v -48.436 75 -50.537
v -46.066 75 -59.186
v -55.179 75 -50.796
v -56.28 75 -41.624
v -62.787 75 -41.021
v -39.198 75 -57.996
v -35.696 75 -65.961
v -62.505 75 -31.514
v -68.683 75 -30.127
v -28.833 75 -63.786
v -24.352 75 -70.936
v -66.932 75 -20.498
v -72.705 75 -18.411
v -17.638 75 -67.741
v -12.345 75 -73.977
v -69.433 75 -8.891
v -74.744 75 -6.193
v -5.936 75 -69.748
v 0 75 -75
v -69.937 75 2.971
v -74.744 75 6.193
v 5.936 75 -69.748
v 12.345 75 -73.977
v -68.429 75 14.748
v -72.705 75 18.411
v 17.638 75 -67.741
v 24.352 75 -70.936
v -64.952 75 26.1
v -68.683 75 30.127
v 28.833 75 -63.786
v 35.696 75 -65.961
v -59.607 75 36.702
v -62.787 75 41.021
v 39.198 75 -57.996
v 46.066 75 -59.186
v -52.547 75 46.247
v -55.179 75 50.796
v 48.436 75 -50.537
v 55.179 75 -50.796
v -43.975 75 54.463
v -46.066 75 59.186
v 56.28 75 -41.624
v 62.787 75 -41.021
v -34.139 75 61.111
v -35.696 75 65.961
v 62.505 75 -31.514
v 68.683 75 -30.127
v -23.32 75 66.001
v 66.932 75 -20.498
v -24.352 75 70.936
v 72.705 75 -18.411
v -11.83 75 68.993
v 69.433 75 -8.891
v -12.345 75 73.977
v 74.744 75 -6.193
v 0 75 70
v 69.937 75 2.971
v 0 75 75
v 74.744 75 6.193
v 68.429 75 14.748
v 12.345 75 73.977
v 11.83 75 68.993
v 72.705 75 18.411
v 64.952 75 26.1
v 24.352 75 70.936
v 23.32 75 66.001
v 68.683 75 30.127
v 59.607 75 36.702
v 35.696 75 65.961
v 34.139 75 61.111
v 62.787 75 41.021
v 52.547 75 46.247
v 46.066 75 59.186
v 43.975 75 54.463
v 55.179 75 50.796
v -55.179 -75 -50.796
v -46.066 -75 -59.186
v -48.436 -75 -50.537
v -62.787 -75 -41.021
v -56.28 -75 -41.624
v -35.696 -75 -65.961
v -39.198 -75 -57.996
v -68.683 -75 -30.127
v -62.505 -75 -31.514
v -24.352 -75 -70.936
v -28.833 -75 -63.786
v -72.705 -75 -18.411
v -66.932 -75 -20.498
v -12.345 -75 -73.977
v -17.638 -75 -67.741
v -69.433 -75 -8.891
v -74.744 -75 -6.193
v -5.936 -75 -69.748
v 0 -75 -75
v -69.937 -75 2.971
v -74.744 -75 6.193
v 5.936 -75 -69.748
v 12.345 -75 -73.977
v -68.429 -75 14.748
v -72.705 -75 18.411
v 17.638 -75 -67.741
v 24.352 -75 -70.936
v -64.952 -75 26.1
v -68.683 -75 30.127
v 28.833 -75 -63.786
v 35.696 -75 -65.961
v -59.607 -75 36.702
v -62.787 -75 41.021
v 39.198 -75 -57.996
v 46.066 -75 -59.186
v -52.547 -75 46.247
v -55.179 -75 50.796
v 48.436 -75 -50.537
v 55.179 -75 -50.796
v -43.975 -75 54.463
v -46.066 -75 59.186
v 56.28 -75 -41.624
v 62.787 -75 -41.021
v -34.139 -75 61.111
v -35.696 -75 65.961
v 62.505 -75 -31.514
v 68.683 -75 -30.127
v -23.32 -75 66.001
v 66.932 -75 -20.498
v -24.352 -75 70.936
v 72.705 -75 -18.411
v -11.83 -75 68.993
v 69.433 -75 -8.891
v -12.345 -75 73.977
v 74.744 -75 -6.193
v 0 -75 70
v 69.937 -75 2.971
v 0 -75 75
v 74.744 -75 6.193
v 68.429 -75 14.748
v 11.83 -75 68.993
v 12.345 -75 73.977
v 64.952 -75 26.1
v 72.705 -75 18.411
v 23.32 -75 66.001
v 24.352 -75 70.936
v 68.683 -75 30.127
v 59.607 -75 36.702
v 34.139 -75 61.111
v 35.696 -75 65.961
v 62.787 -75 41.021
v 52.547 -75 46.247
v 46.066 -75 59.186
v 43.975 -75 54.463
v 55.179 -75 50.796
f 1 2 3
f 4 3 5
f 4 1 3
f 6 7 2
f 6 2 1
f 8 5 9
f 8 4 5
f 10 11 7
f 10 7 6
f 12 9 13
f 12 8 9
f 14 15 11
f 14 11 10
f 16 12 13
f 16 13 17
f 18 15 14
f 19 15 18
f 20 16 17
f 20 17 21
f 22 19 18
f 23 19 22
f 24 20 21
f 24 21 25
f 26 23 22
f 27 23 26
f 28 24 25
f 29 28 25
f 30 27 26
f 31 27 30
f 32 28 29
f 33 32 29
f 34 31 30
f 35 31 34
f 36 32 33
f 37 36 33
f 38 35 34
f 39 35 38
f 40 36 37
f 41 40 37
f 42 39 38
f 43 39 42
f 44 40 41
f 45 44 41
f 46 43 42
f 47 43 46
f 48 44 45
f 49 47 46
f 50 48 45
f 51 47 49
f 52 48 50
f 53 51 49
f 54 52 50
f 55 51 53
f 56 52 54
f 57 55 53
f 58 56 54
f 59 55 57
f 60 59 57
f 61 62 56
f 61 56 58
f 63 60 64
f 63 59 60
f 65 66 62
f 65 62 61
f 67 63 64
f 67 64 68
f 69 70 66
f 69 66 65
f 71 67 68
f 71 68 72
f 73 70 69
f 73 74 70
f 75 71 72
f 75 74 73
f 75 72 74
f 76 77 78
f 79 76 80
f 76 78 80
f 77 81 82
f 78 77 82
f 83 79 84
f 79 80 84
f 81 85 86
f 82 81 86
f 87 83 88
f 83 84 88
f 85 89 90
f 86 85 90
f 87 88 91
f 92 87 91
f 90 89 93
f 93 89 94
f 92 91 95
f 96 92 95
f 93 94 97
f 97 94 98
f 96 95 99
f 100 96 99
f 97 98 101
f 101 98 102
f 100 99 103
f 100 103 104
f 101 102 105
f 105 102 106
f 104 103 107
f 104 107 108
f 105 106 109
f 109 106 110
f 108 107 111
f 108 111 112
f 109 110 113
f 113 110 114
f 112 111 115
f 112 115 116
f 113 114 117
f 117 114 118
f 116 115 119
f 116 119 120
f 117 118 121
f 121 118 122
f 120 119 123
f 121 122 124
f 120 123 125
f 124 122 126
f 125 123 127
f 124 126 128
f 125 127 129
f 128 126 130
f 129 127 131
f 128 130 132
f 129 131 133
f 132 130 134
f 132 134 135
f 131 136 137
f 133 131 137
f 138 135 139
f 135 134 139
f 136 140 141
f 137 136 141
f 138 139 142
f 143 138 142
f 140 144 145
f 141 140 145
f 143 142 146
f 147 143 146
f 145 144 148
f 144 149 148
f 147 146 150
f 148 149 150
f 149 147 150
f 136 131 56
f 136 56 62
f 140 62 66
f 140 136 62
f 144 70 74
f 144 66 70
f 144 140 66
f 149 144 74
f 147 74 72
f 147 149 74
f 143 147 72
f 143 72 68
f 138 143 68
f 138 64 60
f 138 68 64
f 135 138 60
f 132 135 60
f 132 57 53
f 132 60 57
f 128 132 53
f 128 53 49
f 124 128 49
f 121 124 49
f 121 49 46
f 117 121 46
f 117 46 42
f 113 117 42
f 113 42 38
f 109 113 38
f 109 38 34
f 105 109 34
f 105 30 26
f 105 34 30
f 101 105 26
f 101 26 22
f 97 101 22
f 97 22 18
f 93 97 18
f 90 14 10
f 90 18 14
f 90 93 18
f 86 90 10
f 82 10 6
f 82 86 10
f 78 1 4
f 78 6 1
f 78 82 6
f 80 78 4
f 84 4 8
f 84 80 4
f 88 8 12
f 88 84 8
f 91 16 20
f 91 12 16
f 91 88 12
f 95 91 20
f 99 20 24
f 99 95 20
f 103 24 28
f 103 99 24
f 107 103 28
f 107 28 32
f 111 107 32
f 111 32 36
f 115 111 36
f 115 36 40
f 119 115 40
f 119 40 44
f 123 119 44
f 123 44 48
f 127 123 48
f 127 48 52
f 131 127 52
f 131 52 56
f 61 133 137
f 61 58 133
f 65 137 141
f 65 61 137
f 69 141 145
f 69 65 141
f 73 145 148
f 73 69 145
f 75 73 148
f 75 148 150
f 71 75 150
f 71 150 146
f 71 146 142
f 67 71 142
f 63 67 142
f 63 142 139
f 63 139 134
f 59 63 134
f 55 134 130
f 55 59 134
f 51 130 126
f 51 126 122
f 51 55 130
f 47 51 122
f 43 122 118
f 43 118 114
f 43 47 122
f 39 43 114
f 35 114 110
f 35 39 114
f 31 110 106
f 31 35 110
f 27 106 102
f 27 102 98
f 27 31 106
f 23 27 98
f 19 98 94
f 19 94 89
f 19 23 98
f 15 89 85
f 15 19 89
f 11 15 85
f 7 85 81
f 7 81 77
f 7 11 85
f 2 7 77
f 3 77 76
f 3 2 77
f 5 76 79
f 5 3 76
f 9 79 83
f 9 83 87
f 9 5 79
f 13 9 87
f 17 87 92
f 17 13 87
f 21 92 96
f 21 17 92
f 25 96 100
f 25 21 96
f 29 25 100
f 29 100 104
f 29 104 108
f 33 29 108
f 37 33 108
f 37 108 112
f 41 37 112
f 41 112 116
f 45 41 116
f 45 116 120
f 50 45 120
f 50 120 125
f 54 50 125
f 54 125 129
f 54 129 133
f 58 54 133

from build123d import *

# Parameters (mm, degrees)
SKETCH1_R               = 75
BOSS_EXTRUDE1_DEPTH     = 75
CUT_EXTRUDE1_DEPTH      = 130.903810568
CUT_EXTRUDE1_DEPTH_BACK = 95
SKETCH2_R               = 70
SKETCH3_R               = 7.5
CUT_EXTRUDE2_DEPTH      = 201.374649095


with BuildPart() as part:
    # Sketch1 → Boss-Extrude1 (new, symmetric)
    with BuildSketch(Plane(origin=(0, 0, 0), x_dir=(1, 0, 0), z_dir=(0, 1, 0))):
        with Locations(Location((0, 0, 0), (0, 0, 270))):
            Circle(SKETCH1_R)
    extrude(amount=BOSS_EXTRUDE1_DEPTH, both=True)

    # Sketch2 → Cut-Extrude1 (cut, two sides: drawn at the far end of the back side and taken through both)
    with BuildSketch(Plane(origin=(0, 0, 0), x_dir=(1, 0, 0), z_dir=(0, 1, 0)).offset(-CUT_EXTRUDE1_DEPTH_BACK)):
        with Locations(Location((0, 0, 0), (0, 0, 270))):
            Circle(SKETCH2_R)
    extrude(amount=CUT_EXTRUDE1_DEPTH + CUT_EXTRUDE1_DEPTH_BACK, mode=Mode.SUBTRACT)

    # Sketch3 → Cut-Extrude2 (cut, through all)
    with BuildSketch(Plane(origin=(0, -95, 0), x_dir=(1, 0, 0), z_dir=(0, 1, 0))):
        Circle(SKETCH3_R)
    extrude(amount=-CUT_EXTRUDE2_DEPTH, mode=Mode.SUBTRACT)


solid = part.part
